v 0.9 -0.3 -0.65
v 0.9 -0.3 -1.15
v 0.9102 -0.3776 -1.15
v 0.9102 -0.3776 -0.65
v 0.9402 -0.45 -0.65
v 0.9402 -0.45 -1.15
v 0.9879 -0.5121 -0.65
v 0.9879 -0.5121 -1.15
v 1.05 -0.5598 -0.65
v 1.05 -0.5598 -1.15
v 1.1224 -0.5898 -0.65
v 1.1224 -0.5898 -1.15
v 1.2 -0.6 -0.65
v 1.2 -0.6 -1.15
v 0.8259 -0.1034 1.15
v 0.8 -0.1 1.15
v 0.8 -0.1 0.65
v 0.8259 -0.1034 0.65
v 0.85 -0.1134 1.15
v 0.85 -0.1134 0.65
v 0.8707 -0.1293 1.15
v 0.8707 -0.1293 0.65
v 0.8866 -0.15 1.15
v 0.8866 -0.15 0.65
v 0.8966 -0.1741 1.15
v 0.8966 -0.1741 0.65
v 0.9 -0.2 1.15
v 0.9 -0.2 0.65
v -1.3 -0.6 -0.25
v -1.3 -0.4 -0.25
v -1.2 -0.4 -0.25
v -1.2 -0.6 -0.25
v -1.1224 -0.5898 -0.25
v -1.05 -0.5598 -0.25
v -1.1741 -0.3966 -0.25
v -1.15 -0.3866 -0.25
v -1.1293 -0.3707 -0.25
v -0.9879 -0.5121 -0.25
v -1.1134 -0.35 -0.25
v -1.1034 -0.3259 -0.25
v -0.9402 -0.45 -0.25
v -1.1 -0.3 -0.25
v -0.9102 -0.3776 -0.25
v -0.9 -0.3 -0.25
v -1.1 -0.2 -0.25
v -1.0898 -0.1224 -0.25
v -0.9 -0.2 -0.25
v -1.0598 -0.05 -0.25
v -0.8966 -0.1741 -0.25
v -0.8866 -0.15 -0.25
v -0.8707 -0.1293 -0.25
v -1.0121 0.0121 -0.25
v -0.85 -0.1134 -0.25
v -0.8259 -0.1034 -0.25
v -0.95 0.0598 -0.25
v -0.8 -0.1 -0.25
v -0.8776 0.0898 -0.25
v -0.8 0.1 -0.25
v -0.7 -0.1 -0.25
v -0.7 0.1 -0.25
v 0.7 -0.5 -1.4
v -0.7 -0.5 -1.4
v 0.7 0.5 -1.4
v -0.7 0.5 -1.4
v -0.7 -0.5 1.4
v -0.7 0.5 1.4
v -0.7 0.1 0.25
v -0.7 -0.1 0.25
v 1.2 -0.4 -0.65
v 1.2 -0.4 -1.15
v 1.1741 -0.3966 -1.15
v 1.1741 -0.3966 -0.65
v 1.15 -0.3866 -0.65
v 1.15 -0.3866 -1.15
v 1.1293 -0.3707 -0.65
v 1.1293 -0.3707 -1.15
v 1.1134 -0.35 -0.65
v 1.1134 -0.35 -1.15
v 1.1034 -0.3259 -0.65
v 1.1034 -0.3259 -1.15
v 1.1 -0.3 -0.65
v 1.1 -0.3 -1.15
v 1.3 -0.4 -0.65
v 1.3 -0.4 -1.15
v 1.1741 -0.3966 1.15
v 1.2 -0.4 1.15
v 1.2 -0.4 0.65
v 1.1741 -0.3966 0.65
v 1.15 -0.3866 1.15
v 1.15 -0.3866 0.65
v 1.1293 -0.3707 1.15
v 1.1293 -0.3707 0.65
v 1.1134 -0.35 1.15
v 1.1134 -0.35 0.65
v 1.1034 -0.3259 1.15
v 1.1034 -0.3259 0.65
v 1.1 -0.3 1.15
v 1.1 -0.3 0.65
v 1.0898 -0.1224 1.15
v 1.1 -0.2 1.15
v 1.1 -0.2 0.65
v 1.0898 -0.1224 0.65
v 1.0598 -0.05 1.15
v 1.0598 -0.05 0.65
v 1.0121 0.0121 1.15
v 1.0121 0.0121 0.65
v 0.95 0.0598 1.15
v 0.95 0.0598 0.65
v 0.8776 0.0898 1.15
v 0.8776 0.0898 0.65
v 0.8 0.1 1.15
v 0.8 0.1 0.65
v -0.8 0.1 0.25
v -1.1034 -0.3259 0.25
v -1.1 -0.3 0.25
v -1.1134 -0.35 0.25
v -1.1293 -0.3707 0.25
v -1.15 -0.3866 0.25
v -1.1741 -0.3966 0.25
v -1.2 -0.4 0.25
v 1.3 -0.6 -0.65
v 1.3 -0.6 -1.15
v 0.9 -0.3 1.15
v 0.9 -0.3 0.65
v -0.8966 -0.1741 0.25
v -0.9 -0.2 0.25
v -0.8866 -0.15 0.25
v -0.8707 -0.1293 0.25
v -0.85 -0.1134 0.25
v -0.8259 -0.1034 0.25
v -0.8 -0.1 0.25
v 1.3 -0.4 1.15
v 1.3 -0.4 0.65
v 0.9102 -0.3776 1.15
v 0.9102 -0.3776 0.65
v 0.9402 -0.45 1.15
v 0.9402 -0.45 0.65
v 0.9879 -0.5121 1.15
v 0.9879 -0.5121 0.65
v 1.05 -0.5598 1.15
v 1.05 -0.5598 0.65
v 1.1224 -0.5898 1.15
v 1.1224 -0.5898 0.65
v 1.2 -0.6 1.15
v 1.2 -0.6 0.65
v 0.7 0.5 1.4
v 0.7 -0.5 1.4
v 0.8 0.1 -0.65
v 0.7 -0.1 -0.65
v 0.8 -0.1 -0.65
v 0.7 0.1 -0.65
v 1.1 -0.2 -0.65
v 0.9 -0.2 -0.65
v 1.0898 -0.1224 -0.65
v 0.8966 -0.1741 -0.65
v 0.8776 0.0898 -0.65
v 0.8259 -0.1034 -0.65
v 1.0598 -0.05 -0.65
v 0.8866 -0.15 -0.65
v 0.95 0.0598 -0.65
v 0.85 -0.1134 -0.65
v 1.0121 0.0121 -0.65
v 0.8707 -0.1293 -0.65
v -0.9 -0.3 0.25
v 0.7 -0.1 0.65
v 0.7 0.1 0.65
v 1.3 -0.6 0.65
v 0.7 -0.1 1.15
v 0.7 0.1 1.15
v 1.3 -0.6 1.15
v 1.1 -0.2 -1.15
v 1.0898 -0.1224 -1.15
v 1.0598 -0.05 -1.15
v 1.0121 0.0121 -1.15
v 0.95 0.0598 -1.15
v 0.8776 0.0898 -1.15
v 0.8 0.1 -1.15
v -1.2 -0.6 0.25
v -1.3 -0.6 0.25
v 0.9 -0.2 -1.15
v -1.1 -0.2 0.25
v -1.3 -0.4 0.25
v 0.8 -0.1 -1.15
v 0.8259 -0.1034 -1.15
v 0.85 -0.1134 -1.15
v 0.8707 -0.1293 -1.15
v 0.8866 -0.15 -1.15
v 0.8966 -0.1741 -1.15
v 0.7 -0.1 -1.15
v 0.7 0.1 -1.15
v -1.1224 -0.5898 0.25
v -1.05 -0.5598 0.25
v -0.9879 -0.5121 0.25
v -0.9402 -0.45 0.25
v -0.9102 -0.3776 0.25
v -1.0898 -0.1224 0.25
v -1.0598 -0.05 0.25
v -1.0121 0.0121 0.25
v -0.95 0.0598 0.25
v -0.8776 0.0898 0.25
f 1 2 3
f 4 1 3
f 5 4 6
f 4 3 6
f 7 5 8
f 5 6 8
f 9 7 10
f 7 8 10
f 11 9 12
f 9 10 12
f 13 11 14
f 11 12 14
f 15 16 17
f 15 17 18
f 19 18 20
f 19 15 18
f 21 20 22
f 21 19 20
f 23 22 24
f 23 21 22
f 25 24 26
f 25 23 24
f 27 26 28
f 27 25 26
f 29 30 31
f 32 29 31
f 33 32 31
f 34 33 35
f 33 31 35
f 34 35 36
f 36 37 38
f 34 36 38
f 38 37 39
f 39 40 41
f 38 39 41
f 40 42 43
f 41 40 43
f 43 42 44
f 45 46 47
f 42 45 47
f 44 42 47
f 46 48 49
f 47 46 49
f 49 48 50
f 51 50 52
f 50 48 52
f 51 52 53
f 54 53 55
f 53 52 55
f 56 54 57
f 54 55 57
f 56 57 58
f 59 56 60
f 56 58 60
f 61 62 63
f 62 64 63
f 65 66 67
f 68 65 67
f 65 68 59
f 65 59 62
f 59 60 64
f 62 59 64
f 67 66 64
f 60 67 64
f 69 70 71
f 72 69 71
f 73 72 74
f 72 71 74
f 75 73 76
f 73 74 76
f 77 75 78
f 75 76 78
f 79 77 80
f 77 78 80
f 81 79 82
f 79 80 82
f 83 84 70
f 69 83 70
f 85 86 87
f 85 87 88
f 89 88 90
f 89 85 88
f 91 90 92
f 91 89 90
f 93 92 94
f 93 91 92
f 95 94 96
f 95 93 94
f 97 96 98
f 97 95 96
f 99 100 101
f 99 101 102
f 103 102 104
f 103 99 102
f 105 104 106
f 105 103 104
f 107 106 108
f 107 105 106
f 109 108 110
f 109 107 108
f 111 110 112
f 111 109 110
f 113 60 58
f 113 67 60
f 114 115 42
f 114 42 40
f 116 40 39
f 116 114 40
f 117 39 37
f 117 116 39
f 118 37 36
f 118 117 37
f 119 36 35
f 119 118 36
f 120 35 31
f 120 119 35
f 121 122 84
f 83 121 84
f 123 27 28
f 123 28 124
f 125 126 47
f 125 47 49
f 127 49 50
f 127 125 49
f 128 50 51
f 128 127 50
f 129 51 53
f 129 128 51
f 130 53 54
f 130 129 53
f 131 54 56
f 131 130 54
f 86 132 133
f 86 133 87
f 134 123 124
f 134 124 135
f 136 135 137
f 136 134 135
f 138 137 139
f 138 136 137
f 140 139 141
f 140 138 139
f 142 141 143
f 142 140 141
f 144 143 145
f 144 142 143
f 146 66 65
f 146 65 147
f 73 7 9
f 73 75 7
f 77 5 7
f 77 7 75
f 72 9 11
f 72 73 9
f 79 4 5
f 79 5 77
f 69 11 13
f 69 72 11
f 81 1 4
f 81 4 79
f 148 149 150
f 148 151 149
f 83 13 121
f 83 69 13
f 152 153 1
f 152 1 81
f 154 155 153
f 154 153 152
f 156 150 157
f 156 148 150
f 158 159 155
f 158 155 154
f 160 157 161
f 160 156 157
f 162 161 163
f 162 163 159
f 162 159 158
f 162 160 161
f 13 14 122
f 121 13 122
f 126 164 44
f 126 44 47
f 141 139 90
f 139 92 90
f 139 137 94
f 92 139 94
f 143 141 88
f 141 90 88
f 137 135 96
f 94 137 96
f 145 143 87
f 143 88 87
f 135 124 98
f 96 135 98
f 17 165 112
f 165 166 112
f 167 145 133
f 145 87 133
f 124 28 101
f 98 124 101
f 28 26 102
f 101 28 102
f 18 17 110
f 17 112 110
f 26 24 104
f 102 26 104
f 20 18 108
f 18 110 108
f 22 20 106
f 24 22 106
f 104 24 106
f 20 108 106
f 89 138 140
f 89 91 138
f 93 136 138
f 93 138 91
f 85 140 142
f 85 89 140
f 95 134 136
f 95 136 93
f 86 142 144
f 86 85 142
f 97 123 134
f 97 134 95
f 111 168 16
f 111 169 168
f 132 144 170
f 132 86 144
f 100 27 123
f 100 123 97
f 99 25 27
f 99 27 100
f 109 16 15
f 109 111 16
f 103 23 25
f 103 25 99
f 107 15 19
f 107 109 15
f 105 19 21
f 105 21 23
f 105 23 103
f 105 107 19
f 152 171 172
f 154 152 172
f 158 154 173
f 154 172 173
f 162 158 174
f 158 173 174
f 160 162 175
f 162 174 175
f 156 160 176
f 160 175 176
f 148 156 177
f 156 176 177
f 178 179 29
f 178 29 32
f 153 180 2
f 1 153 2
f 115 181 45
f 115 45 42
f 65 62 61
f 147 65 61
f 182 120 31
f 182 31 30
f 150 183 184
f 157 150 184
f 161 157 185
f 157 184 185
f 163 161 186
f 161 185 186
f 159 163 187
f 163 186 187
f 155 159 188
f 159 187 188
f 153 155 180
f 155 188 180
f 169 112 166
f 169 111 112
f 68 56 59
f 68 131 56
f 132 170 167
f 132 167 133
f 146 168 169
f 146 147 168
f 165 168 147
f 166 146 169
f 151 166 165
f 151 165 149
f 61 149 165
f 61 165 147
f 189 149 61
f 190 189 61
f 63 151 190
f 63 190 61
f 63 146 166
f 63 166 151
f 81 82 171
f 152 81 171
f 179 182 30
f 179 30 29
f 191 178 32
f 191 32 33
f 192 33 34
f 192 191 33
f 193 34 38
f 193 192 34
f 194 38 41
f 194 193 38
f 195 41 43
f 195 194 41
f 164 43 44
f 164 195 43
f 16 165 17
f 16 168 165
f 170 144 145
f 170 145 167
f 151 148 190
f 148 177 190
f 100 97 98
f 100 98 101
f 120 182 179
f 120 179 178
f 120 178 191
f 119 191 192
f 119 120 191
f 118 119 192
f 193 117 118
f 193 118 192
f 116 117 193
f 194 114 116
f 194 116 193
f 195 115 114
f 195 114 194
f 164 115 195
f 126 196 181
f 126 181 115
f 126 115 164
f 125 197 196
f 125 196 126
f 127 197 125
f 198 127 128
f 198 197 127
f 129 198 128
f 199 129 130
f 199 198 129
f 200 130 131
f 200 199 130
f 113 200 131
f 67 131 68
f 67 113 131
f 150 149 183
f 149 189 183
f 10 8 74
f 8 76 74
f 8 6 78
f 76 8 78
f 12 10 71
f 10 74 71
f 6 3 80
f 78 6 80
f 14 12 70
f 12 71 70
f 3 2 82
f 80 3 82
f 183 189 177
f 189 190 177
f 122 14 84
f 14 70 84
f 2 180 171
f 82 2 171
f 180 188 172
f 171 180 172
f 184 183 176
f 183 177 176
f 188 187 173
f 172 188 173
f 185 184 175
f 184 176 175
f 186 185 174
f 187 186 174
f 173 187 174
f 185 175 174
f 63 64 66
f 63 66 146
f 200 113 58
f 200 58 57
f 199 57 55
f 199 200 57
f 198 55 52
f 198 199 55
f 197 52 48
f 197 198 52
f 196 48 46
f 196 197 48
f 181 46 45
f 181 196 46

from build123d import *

# Parameters (mm, degrees)
BASES_W    = 1.4
BASES_H    = 2.8
BASE_DEPTH = 0.5
LEG1_DEPTH = 0.25
LEG2_DEPTH = 0.25


with BuildPart() as part:
    # BaseS → Base (new body, symmetric)
    with BuildSketch(Plane(origin=(0, 0, 0), x_dir=(1, 0, 0), z_dir=(0, 1, 0))):
        Rectangle(BASES_W, BASES_H)
    extrude(amount=BASE_DEPTH, both=True)

    # Leg1S → Leg1 (add, symmetric)
    with BuildSketch(Plane.XY):
        with BuildLine():
            Line((-0.7, 0.1), (-0.8, 0.1))
            ThreePointArc((-0.8, 0.1), (-1.012132034, 0.012132034), (-1.1, -0.2))
            Line((-1.1, -0.2), (-1.1, -0.3))
            ThreePointArc((-1.1, -0.3), (-1.129289322, -0.370710678), (-1.2, -0.4))
            Line((-1.2, -0.4), (-1.3, -0.4))
            Line((-1.3, -0.4), (-1.3, -0.6))
            Line((-1.3, -0.6), (-1.2, -0.6))
            ThreePointArc((-1.2, -0.6), (-0.987867966, -0.512132034), (-0.9, -0.3))
            Line((-0.9, -0.3), (-0.9, -0.2))
            ThreePointArc((-0.9, -0.2), (-0.870710678, -0.129289322), (-0.8, -0.1))
            Line((-0.8, -0.1), (-0.7, -0.1))
            Line((-0.7, -0.1), (-0.7, 0.1))
        make_face()
    extrude(amount=LEG1_DEPTH, both=True)

    # Leg2S → Leg2 (add, symmetric)
    with BuildSketch(Plane.XY.offset(0.9)):
        with BuildLine():
            Line((0.7, -0.1), (0.8, -0.1))
            ThreePointArc((0.8, -0.1), (0.870710678, -0.129289322), (0.9, -0.2))
            Line((0.9, -0.2), (0.9, -0.3))
            ThreePointArc((0.9, -0.3), (0.987867966, -0.512132034), (1.2, -0.6))
            Line((1.2, -0.6), (1.3, -0.6))
            Line((1.3, -0.6), (1.3, -0.4))
            Line((1.3, -0.4), (1.2, -0.4))
            ThreePointArc((1.2, -0.4), (1.129289322, -0.370710678), (1.1, -0.3))
            Line((1.1, -0.3), (1.1, -0.2))
            ThreePointArc((1.1, -0.2), (1.012132034, 0.012132034), (0.8, 0.1))
            Line((0.8, 0.1), (0.7, 0.1))
            Line((0.7, 0.1), (0.7, -0.1))
        make_face()
    leg2 = extrude(amount=LEG2_DEPTH, both=True)

    # Leg2M: Leg2 across plane
    add(leg2.mirror(Plane.XY))


solid = part.part
